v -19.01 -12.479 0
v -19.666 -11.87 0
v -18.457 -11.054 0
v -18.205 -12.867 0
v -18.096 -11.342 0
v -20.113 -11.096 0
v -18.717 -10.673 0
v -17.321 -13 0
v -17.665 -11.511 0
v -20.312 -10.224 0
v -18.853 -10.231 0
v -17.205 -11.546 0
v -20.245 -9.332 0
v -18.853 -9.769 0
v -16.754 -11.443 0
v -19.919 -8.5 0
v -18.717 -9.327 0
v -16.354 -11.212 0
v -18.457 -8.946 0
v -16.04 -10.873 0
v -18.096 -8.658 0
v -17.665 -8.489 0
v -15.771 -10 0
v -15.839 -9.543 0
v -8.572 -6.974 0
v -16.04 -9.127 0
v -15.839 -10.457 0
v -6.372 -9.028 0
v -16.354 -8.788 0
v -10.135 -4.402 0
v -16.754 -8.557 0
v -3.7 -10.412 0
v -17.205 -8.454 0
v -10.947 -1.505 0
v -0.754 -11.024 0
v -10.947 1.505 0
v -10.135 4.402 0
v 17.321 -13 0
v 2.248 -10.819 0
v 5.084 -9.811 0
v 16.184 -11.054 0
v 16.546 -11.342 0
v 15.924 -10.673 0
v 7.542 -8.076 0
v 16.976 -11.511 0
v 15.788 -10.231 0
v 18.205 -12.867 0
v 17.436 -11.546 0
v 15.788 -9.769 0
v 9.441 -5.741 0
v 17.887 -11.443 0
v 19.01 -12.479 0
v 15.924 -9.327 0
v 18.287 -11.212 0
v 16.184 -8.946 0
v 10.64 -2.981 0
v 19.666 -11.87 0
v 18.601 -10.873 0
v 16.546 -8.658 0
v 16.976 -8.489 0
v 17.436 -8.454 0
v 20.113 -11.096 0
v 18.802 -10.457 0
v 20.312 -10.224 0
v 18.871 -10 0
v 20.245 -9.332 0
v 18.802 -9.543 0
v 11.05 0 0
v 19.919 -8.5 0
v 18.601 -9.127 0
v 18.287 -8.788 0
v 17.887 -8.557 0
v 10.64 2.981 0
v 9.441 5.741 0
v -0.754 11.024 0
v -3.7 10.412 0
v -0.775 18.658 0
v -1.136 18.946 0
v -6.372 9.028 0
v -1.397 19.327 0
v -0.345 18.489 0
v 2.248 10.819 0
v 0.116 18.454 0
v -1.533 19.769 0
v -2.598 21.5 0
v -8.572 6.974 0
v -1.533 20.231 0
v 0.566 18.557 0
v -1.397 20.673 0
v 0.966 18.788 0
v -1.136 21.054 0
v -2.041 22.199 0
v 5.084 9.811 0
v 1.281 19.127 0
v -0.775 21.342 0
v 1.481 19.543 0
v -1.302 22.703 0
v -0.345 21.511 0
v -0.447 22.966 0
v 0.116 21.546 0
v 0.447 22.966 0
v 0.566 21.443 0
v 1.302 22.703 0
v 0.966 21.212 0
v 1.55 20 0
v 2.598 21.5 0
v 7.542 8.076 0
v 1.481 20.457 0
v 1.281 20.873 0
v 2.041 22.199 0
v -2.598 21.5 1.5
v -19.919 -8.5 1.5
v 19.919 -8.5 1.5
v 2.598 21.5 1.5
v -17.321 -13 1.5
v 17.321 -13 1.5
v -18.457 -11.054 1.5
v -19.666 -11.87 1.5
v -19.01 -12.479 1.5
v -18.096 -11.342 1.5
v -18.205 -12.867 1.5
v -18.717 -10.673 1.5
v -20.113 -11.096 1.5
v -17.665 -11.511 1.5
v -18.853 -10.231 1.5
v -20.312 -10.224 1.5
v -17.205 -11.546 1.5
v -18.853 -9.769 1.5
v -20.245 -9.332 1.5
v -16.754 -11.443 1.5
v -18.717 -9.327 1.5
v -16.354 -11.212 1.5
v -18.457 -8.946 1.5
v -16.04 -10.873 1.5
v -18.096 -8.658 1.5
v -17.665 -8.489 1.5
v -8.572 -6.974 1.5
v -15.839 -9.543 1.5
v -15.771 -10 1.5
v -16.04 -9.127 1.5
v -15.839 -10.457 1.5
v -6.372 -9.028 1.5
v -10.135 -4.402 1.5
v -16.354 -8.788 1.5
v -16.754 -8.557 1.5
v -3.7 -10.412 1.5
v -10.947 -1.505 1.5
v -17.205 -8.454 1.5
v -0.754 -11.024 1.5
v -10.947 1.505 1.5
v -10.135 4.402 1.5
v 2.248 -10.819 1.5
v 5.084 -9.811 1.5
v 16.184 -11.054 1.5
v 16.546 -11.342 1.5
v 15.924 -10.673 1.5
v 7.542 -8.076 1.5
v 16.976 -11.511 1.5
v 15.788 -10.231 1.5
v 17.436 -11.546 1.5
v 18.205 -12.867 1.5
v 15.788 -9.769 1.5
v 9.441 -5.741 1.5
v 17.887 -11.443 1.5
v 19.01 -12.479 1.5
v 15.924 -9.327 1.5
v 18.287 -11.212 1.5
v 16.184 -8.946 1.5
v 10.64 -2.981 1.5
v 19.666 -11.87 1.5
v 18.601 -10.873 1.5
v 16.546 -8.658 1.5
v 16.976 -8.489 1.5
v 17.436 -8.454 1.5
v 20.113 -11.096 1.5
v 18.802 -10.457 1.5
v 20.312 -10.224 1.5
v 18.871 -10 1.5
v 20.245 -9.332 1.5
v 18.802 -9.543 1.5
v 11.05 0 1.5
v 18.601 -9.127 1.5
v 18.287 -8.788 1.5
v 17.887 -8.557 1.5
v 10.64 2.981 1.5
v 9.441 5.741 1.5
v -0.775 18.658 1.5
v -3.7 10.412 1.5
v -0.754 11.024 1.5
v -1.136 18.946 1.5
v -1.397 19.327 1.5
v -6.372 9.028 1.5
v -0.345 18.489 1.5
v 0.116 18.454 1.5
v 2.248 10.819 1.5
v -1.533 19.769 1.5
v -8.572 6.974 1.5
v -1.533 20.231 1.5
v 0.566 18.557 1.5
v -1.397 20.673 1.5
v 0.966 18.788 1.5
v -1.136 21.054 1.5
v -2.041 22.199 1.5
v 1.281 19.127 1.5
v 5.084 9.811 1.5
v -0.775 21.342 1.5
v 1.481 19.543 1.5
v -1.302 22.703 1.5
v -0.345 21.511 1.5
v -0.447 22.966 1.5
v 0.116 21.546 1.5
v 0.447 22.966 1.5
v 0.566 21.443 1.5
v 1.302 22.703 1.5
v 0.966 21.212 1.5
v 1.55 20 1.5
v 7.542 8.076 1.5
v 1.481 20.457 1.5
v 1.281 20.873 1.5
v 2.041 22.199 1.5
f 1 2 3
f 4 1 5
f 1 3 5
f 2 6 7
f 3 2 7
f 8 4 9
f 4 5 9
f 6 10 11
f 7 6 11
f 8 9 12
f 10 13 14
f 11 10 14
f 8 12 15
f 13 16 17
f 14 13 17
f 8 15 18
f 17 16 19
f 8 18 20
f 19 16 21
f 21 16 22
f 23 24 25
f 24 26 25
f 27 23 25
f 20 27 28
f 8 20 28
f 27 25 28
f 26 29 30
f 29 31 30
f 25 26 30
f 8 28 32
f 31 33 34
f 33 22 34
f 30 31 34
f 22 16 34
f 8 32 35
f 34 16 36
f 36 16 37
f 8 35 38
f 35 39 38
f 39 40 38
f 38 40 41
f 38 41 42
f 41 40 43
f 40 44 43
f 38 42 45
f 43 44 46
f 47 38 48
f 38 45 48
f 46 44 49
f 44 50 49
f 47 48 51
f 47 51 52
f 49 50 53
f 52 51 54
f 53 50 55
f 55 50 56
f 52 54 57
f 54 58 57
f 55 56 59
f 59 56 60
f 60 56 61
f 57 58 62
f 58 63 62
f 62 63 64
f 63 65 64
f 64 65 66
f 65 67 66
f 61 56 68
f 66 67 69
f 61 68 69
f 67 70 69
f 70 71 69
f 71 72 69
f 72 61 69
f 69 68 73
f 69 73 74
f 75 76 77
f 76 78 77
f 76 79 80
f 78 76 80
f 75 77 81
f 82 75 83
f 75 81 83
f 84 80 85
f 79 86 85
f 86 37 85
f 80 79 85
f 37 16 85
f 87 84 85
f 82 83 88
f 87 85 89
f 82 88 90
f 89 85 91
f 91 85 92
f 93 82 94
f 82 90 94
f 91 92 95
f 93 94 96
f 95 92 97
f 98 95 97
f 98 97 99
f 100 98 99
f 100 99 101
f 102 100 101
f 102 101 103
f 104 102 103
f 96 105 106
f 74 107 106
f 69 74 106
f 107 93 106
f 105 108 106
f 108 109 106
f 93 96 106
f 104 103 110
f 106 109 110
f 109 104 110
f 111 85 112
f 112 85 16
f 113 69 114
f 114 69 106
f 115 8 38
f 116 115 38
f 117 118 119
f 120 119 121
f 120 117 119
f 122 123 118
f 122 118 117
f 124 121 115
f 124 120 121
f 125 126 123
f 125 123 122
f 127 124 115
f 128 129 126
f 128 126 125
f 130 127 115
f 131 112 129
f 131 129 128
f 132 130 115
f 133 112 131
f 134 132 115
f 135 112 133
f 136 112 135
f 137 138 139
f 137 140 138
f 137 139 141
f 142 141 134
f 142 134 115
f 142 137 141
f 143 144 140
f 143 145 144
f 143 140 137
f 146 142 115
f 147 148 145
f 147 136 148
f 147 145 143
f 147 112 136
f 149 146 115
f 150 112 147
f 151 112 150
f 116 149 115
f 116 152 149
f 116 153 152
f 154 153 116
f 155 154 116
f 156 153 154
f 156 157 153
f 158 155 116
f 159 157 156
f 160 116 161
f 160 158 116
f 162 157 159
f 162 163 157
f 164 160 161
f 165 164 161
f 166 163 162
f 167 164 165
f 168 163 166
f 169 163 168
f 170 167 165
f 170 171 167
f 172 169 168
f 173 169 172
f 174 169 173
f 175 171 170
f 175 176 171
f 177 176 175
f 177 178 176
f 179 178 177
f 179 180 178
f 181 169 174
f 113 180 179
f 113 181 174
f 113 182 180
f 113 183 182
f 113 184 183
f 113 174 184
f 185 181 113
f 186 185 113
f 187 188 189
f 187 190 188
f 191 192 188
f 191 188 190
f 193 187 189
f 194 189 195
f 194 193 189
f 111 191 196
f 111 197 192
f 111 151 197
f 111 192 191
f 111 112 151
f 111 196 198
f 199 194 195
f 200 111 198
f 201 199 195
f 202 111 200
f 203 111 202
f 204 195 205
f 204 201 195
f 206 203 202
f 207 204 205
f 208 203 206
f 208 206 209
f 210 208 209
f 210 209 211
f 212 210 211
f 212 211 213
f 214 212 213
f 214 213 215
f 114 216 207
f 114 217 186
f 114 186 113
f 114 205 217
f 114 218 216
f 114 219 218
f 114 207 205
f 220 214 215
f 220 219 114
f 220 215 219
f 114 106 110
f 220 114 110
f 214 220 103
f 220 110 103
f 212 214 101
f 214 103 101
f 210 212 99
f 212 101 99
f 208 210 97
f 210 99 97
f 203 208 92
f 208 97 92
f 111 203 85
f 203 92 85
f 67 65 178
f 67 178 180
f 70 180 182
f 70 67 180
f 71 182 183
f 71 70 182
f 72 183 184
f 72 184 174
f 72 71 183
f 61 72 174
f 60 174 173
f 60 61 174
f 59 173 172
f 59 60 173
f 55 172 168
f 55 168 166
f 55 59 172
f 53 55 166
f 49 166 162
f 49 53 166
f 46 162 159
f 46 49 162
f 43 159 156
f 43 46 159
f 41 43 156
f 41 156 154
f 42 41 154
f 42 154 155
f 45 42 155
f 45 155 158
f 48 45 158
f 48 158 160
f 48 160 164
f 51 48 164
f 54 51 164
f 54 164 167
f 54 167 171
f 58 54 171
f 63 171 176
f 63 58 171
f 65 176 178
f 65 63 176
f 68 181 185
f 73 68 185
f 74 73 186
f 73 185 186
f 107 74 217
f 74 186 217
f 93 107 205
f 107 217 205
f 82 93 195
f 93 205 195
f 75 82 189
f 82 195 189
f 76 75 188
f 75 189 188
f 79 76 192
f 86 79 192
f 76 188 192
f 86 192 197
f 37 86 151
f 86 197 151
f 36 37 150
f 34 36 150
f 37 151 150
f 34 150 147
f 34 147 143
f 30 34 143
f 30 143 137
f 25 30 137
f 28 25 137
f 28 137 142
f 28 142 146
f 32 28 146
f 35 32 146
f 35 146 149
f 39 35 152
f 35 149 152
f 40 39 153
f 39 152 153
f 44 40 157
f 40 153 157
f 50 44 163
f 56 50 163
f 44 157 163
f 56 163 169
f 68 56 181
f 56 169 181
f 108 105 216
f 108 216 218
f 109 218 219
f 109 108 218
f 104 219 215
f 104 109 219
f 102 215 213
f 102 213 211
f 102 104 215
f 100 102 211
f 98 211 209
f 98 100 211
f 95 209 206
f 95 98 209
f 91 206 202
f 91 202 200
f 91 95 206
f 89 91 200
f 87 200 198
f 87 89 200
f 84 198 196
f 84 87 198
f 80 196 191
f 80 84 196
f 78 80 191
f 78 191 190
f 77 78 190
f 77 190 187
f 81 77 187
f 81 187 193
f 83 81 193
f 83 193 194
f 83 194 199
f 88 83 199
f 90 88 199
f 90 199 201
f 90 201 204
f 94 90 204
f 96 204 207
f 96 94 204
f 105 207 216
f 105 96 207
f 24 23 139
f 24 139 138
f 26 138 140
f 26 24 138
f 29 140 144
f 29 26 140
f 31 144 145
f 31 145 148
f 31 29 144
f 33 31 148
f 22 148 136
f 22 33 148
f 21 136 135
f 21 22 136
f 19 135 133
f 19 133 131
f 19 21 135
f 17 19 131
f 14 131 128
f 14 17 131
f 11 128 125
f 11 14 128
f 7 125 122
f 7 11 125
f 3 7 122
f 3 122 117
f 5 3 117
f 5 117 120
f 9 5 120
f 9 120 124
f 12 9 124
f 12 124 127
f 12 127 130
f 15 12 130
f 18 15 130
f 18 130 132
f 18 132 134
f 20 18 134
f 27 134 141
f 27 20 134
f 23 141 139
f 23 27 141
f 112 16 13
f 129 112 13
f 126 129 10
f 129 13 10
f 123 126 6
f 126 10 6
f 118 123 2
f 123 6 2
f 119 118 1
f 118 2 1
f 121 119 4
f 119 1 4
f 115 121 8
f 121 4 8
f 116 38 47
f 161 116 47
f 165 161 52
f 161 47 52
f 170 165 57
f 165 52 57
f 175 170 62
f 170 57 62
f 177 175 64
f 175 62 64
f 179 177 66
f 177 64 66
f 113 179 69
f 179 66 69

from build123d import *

# Parameters (mm, degrees)
SKETCH_1_R          = 1.55
EXTRUDE_1_DEPTH     = 1.5
SKETCH_2_R          = 11.05
CUT_EXTRUDE_1_DEPTH = 1.5


with BuildPart() as part:
    # 草图1 → 凸台-拉伸1 (new body)
    with BuildSketch(Plane.XY):
        with BuildLine():
            Line((-2.598076211, 21.5), (-19.918584287, -8.5))
            ThreePointArc((-19.918584287, -8.5), (-19.918584287, -11.5), (-17.320508076, -13))
            Line((-17.320508076, -13), (17.320508076, -13))
            ThreePointArc((17.320508076, -13), (19.918584287, -11.5), (19.918584287, -8.5))
            Line((19.918584287, -8.5), (2.598076211, 21.5))
            ThreePointArc((2.598076211, 21.5), (0, 23), (-2.598076211, 21.5))
        make_face()
        with Locations((0, 20)):
            Circle(SKETCH_1_R, mode=Mode.SUBTRACT)
        with Locations((-17.320508076, -10)):
            Circle(SKETCH_1_R, mode=Mode.SUBTRACT)
        with Locations((17.320508076, -10)):
            Circle(SKETCH_1_R, mode=Mode.SUBTRACT)
    extrude(amount=EXTRUDE_1_DEPTH)

    # 草图2 → 切除-拉伸1 (cut)
    with BuildSketch(Plane.XY.offset(1.5)):
        Circle(SKETCH_2_R)
    extrude(amount=-CUT_EXTRUDE_1_DEPTH, mode=Mode.SUBTRACT)


solid = part.part
